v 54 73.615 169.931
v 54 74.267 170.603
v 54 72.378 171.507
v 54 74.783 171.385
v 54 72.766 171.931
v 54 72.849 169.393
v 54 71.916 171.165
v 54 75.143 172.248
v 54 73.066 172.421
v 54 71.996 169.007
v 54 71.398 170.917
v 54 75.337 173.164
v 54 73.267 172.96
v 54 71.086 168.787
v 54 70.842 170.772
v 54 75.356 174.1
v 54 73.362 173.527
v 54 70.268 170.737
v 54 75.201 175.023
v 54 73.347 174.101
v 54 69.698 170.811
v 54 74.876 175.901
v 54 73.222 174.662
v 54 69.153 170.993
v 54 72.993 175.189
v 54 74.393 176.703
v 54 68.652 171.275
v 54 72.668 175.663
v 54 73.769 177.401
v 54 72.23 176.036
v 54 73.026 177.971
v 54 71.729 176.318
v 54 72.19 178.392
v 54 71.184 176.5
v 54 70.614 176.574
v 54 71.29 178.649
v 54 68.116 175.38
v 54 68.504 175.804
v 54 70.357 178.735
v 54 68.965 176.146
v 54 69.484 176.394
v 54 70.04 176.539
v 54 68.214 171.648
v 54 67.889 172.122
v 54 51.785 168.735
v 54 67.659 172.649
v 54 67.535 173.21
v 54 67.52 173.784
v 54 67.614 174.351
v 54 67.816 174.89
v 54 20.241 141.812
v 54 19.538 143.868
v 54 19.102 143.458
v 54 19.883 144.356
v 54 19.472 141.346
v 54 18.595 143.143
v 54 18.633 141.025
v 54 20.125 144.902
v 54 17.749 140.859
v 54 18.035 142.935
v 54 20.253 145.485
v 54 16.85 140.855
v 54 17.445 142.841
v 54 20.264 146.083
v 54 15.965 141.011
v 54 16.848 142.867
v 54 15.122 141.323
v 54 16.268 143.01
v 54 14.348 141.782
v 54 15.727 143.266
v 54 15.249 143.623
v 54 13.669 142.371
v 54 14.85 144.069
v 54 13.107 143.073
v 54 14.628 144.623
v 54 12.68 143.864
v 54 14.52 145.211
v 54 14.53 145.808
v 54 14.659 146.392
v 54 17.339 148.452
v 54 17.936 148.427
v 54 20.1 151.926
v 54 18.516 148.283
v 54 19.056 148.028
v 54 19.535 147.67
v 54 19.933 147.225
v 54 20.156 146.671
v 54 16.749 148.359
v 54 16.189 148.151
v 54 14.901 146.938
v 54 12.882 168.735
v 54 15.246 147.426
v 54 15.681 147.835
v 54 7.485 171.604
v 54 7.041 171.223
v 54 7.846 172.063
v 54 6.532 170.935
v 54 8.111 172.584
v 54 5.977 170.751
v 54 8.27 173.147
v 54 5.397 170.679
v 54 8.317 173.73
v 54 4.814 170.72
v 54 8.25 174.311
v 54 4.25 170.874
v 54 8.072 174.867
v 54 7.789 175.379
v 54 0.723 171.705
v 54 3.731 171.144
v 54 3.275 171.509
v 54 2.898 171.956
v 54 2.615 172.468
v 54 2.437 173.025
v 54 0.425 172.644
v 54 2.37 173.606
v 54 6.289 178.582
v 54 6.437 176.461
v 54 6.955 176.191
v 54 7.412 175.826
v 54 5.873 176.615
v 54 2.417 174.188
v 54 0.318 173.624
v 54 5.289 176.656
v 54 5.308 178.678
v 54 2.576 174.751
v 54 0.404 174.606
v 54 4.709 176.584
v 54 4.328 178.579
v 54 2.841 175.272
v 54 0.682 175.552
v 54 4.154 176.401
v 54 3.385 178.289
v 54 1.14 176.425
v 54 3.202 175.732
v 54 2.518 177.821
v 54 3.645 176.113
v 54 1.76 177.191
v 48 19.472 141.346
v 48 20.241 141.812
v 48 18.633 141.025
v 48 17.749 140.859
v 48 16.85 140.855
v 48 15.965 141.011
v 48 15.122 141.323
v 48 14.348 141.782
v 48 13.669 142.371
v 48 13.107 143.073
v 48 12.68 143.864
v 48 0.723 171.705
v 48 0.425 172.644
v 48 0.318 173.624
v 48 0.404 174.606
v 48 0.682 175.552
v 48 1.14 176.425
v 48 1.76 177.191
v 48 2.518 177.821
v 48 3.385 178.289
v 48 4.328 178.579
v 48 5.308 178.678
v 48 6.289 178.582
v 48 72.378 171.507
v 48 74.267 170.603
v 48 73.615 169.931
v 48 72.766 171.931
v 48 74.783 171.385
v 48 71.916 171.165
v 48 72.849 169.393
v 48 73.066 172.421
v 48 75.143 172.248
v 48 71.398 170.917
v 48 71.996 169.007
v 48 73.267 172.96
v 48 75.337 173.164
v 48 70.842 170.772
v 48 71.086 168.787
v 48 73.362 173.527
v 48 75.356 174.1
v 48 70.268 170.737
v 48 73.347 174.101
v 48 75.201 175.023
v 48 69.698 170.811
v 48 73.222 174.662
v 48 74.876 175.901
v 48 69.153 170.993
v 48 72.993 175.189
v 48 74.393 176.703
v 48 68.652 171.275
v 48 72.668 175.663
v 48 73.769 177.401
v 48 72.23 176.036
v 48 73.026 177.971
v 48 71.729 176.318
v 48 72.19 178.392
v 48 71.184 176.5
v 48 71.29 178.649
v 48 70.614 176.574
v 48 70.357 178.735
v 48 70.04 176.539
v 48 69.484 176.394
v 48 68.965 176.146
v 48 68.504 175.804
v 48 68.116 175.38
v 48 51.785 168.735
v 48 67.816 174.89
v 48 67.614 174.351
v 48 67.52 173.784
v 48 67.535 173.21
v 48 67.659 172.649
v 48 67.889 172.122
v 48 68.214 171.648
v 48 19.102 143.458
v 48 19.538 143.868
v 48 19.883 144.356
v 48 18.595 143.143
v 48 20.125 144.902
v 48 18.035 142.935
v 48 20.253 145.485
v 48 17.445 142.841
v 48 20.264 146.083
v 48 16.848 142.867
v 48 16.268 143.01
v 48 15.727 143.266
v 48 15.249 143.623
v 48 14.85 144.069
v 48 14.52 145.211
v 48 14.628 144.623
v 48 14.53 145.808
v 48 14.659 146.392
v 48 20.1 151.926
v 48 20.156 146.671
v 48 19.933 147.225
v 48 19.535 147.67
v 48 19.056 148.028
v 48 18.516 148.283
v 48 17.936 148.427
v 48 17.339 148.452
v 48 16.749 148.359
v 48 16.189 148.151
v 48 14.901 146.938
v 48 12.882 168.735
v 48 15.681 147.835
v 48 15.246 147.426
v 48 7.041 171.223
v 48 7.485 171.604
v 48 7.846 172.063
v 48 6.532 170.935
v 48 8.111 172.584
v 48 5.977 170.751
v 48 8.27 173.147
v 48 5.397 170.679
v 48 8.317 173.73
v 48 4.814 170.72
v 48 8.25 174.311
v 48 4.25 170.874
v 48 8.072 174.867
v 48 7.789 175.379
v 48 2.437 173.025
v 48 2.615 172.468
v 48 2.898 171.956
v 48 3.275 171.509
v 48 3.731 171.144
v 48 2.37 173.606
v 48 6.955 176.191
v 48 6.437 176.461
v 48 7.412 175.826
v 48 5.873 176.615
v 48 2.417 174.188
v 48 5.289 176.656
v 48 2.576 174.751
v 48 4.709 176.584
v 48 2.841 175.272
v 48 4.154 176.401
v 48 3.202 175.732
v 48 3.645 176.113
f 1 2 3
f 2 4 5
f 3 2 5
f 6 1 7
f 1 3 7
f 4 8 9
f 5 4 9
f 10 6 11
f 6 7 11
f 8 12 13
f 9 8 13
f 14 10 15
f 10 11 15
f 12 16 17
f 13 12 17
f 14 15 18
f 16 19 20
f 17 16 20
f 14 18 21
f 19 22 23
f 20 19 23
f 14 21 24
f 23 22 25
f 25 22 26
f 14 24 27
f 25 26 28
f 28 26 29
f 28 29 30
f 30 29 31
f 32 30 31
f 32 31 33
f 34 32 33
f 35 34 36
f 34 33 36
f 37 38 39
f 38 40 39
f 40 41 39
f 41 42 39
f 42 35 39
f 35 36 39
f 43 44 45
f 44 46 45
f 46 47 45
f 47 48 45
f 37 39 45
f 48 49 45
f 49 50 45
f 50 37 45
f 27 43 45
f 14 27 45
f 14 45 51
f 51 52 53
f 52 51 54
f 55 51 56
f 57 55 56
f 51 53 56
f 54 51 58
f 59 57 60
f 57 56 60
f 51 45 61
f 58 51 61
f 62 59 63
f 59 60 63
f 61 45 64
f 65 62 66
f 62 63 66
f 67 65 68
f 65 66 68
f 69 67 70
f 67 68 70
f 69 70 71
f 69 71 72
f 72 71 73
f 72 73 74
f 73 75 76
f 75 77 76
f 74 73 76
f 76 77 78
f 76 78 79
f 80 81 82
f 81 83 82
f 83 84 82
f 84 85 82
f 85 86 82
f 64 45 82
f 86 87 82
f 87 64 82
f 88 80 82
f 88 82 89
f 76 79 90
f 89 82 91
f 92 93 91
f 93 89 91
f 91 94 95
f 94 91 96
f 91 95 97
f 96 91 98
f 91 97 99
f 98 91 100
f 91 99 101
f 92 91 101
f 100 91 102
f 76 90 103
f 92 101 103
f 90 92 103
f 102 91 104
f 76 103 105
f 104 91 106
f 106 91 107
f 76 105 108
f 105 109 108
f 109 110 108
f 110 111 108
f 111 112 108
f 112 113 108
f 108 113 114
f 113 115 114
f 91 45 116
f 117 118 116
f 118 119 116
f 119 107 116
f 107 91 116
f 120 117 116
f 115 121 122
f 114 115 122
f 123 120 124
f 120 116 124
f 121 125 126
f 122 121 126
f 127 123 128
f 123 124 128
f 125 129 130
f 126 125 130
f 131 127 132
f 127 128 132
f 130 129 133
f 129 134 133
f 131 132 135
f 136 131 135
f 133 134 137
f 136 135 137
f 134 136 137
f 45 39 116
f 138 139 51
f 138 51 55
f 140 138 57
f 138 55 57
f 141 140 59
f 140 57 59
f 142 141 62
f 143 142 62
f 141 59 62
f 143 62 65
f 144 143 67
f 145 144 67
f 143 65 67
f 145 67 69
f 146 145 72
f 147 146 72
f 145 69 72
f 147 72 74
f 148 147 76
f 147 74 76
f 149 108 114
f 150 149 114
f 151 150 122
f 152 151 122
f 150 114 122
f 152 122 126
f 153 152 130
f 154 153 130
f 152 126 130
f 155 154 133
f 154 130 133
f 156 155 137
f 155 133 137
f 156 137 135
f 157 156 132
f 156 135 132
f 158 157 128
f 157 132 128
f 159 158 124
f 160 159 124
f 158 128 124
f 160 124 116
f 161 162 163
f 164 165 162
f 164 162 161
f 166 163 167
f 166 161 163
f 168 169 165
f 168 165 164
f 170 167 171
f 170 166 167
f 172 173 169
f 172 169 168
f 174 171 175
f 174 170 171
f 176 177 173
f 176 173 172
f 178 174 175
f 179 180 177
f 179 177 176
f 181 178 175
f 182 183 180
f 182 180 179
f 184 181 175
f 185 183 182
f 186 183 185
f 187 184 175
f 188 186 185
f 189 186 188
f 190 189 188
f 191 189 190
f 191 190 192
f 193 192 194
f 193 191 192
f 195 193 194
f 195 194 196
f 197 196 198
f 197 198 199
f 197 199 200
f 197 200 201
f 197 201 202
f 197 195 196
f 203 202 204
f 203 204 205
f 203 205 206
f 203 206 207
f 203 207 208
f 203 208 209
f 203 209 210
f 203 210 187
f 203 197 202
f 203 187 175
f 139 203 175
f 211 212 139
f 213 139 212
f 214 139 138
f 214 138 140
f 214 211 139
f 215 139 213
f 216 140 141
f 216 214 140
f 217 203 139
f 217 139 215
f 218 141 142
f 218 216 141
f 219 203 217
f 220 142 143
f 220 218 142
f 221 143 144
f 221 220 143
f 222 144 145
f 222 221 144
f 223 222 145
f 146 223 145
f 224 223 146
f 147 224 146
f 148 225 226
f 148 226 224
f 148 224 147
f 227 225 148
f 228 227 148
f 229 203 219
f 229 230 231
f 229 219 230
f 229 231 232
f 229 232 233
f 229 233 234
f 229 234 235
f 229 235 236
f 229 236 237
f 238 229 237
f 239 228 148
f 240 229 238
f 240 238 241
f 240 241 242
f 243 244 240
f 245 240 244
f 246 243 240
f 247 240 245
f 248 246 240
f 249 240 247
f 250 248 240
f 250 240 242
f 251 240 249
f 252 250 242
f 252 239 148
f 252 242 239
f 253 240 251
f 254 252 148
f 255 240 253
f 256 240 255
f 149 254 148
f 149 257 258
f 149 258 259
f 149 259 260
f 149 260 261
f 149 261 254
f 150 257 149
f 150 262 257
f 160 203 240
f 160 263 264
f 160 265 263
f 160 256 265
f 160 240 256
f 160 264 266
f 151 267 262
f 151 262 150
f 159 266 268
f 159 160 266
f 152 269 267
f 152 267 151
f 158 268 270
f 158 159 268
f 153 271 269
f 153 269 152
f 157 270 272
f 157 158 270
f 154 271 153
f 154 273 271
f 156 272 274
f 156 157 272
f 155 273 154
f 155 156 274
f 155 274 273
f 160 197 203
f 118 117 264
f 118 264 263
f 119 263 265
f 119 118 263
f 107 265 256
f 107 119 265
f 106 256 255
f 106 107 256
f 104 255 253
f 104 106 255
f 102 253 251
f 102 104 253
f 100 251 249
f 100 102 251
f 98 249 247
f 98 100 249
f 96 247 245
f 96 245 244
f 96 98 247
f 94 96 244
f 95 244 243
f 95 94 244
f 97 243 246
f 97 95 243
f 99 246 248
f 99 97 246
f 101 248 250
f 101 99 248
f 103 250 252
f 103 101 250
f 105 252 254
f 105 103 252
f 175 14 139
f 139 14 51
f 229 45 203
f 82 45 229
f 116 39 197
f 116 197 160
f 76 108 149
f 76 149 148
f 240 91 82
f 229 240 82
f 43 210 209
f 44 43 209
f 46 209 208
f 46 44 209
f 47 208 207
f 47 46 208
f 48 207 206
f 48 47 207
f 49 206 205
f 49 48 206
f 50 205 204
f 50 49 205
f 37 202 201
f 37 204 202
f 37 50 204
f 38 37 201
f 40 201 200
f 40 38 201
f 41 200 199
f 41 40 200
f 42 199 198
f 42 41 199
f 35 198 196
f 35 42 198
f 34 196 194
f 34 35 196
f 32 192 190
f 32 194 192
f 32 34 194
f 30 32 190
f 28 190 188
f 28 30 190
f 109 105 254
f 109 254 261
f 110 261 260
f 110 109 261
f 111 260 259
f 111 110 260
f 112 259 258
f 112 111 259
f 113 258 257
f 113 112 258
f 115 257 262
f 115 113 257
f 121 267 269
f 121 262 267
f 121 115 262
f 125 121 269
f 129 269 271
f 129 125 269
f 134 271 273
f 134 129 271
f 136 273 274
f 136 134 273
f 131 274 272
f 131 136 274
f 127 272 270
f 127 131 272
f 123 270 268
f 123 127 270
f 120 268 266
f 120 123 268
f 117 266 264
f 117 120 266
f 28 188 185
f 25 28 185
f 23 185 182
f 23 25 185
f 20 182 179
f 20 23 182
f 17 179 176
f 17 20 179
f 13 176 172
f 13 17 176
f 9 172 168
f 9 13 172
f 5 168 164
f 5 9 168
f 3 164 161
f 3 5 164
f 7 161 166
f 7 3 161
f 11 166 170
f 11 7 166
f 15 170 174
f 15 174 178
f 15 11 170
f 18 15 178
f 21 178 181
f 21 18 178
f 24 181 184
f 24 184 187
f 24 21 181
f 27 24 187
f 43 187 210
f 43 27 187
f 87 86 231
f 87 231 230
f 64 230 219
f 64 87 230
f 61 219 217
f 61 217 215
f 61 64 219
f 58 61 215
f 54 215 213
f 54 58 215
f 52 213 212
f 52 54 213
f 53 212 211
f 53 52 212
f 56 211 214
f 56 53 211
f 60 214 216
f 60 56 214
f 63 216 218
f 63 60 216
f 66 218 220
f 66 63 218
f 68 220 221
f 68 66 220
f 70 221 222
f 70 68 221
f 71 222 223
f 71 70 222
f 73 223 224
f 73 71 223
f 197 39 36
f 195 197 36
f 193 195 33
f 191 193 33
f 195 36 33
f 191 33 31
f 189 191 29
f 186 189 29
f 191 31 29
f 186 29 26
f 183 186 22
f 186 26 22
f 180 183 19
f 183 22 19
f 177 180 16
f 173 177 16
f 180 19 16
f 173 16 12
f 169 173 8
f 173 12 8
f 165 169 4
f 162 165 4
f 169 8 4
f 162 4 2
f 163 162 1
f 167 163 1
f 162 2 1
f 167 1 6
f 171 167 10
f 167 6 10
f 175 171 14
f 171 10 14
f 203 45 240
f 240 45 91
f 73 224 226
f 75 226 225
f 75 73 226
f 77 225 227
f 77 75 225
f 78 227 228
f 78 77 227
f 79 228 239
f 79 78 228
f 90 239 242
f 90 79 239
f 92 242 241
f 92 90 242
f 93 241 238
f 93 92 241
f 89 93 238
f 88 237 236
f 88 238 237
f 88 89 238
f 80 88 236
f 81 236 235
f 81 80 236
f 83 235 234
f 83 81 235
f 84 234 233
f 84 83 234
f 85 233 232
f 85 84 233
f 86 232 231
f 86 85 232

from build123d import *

# Parameters (mm, degrees)
SKETCH006_R      = 3
EXTRUDE004_DEPTH = 6
SKETCH004_R      = 3
EXTRUDE003_DEPTH = 6
SKETCH005_R      = 3
EXTRUDE005_DEPTH = 6


with BuildPart() as der:
    # Sketch006 → Extrude004 (new body)
    with BuildSketch(Plane(origin=(0, 0, 0), x_dir=(0, -1, 0), z_dir=(-1, 0, 0))):
        with BuildLine():
            ThreePointArc((-10.803604, 3.701349), (-16.887759, 1.835055), (-15.021464, -4.2491))
            Line((-15.021464, -4.2491), (37.981534, -32.368171))
            ThreePointArc((37.981534, -32.368171), (44.065689, -30.501877), (42.199395, -24.417722))
            Line((-10.803604, 3.701349), (42.199395, -24.417722))
        make_face()
        with Locations((-12.912534, -0.273875)):
            Circle(SKETCH006_R, mode=Mode.SUBTRACT)
        with Locations((40.090464, -28.392947)):
            Circle(SKETCH006_R, mode=Mode.SUBTRACT)
    extrude(amount=EXTRUDE004_DEPTH)


with BuildPart() as arriba:
    # Sketch004 → Extrude003 (new body)
    with BuildSketch(Plane(origin=(0, 0, 0), x_dir=(0, -1, 0), z_dir=(-1, 0, 0))):
        with BuildLine():
            ThreePointArc((-12.757495, 4.884875), (-17.769398, -0.109168), (-12.769395, -5.115125))
            Line((-12.769395, -5.115125), (52.23079, -5.115125))
            ThreePointArc((52.23079, -5.115125), (57.153448, -0.19832), (52.242505, 4.730186))
            Line((-12.757495, 4.884875), (52.242505, 4.730186))
        make_face()
        with Locations((-12.769395, -0.115118)):
            Circle(SKETCH004_R, mode=Mode.SUBTRACT)
        with Locations((52.23079, -0.192462)):
            Circle(SKETCH004_R, mode=Mode.SUBTRACT)
    extrude(amount=EXTRUDE003_DEPTH)


with BuildPart() as triangulo:
    # Sketch005 → Extrude005 (new body)
    with BuildSketch(Plane(origin=(0, 0, 0), x_dir=(0, -1, 0), z_dir=(-1, 0, 0))):
        with BuildLine():
            ThreePointArc((56.876804, -2.145211), (54.255545, 4.422056), (47.688278, 1.800797))
            Line((47.688278, 1.800797), (35.731876, -26.04044))
            ThreePointArc((35.731876, -26.04044), (38.353136, -32.607707), (44.920403, -29.986447))
            Line((56.876804, -2.145211), (44.920403, -29.986447))
        make_face()
        with Locations((40.326139, -28.013444)):
            Circle(SKETCH005_R, mode=Mode.SUBTRACT)
        with Locations((52.282541, -0.172207)):
            Circle(SKETCH005_R, mode=Mode.SUBTRACT)
    extrude(amount=EXTRUDE005_DEPTH)

    # Fusion018: union Der, arriba
    add(der.part)
    add(arriba.part)


with BuildPart() as triangulo_1:
    # Fusion018 placement: moved
    add(triangulo.part.moved(Location((54, 57.6, 173.85))))


solid = triangulo_1.part
